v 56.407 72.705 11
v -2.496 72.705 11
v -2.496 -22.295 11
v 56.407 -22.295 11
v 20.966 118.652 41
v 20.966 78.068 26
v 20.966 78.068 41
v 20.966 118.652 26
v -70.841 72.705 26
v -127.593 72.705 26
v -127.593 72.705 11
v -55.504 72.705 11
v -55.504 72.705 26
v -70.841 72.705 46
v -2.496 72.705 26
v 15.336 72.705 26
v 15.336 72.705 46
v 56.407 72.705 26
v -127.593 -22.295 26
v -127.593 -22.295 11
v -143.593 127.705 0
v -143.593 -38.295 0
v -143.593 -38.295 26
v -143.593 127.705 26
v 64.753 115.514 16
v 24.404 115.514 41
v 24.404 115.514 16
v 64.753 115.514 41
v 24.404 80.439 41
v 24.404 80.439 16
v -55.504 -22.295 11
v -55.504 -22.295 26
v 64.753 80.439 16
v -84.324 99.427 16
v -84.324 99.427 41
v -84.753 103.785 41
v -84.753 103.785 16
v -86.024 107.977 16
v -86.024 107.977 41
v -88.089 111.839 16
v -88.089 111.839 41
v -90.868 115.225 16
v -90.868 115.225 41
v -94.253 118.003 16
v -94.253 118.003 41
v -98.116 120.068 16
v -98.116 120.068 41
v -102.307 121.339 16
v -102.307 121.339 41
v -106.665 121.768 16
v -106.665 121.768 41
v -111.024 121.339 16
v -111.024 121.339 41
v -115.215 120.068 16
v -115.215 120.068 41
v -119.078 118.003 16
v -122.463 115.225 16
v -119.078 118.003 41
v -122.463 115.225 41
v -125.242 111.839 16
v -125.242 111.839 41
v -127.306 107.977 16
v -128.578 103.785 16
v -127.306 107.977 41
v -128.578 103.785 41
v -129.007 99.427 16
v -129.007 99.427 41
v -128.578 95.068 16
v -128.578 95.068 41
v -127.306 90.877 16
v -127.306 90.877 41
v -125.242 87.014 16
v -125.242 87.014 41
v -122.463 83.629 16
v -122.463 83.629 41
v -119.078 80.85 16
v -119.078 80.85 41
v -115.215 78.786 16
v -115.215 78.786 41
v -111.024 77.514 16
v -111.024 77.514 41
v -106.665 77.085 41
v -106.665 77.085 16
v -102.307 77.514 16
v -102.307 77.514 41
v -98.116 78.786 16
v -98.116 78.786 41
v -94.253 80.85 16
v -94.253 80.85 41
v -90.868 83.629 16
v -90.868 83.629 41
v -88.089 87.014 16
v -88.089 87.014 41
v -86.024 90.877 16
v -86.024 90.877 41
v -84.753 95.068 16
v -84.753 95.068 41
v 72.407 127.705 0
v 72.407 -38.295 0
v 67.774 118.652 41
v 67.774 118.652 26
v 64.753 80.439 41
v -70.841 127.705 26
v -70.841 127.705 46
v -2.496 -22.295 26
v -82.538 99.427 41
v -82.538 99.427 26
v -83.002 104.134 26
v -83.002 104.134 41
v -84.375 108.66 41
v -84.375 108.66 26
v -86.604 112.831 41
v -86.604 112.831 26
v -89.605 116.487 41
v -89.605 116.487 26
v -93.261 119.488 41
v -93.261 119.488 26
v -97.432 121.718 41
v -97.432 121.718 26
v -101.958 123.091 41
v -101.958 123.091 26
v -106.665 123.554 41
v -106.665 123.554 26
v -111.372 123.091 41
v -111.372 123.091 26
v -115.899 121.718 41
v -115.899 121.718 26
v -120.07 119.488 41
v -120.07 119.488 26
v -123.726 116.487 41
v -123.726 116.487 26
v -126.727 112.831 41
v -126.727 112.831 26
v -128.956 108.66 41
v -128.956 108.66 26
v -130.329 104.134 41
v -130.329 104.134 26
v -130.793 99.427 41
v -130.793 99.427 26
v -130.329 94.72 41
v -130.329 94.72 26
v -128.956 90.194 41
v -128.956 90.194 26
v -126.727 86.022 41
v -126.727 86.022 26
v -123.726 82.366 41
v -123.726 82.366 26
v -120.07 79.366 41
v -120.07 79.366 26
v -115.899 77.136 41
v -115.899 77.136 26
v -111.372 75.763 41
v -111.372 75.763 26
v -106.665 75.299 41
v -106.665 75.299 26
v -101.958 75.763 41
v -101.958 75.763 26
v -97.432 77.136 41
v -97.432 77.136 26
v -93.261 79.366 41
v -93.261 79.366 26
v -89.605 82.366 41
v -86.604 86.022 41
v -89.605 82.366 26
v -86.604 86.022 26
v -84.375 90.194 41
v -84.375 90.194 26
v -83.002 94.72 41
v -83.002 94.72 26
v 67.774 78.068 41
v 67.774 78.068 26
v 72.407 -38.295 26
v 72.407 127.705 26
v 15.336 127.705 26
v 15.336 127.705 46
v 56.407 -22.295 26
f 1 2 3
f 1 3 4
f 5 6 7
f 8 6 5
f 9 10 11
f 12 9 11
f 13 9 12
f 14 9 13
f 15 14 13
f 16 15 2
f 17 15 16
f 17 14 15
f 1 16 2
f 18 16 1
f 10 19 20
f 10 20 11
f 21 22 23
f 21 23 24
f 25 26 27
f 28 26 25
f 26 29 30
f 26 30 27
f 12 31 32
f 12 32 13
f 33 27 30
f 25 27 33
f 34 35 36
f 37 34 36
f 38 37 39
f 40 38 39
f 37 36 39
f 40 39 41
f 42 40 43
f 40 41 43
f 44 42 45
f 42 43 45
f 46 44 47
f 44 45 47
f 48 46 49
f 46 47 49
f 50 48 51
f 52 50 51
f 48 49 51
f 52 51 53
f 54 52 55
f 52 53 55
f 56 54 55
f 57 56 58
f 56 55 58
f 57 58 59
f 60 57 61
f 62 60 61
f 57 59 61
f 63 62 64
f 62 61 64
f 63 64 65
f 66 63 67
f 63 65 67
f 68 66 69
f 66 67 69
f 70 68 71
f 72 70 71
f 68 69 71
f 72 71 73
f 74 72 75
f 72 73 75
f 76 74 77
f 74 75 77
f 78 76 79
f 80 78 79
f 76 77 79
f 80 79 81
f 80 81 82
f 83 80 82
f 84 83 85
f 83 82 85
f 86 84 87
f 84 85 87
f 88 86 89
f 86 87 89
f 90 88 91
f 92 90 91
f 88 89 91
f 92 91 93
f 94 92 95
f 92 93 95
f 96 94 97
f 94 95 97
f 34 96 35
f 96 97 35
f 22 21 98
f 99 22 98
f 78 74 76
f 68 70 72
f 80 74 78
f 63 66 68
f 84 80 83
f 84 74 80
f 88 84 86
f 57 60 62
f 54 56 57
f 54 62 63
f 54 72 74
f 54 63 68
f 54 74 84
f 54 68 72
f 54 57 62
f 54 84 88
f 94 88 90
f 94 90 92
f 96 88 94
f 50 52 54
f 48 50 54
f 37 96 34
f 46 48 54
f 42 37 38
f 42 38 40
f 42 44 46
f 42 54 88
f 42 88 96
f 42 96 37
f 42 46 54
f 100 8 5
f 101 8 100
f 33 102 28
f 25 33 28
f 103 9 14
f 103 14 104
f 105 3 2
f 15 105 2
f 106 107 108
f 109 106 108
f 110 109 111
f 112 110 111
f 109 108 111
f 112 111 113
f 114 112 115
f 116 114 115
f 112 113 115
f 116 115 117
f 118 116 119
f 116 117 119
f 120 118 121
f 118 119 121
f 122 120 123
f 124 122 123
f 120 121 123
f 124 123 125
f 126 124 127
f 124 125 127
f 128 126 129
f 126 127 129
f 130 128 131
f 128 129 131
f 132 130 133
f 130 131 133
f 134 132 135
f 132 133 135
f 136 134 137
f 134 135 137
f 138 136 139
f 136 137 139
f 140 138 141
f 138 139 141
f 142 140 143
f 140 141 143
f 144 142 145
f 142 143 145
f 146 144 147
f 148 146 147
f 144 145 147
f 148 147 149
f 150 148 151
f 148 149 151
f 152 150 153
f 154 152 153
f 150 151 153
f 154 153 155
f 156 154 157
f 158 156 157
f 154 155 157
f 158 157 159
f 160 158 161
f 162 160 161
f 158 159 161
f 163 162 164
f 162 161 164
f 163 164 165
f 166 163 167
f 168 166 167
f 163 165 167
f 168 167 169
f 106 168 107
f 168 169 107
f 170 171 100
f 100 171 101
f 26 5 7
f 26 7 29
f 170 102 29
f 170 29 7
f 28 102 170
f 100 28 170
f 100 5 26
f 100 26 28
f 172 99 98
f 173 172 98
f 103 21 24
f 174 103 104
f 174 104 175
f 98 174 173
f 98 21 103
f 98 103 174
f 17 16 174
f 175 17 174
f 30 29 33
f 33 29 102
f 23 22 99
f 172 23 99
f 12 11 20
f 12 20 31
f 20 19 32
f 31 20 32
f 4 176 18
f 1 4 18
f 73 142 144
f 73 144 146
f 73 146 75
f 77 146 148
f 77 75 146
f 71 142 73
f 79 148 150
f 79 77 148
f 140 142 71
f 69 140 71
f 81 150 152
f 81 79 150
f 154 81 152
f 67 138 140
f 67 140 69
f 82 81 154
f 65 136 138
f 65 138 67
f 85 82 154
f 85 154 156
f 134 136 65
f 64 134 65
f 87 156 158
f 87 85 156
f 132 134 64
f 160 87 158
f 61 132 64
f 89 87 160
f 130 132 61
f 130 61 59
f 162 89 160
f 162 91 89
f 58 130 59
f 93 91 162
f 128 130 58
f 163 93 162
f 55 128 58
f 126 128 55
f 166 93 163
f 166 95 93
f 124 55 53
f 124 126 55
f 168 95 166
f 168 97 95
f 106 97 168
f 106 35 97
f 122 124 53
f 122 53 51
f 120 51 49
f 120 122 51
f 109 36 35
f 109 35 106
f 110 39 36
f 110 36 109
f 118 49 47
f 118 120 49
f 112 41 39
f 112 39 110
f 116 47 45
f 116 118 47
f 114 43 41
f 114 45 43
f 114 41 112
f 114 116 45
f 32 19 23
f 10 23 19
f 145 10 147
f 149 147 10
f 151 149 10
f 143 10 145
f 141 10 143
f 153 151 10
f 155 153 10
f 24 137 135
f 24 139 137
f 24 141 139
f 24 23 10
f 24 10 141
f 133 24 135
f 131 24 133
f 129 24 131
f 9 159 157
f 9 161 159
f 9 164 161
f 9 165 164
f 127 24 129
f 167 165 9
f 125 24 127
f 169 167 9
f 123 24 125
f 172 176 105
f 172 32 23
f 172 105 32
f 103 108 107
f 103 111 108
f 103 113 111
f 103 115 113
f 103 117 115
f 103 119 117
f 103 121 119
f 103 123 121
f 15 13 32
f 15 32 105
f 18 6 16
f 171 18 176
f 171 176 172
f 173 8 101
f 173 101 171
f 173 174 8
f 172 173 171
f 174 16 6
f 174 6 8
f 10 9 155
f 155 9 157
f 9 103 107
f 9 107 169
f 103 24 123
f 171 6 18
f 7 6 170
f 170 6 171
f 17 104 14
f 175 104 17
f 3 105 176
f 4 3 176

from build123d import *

# Parameters (mm, degrees)
F0_W      = 216
F0_H      = 166
F1_DEPTH  = 26
F2_W      = 184
F2_H      = 95
F3_DEPTH  = 15
F4_W      = 86.176178
F4_H      = 55
F5_DEPTH  = 20
F6_W      = 53.007906
F6_H      = 95
F7_DEPTH  = 15
F8_R      = 24.127346
F9_DEPTH  = 15
F10_R     = 22.341692
F11_DEPTH = 25
F12_W     = 46.807702
F12_H     = 40.58332
F13_DEPTH = 15
F14_W     = 40.349298
F14_H     = 35.074882
F15_DEPTH = 25


with BuildPart() as f1:
    # F0 (on Top) → F1 (new body)
    with BuildSketch(Plane.XY):
        with Locations((-35.592673, 44.704702)):
            Rectangle(F0_W, F0_H)
    extrude(amount=F1_DEPTH)

    # F2 (on face) → F3 (cut)
    with BuildSketch(Plane.XY.offset(26)):
        with Locations((-35.592673, 25.204702)):
            Rectangle(F2_W, F2_H)
    extrude(amount=-F3_DEPTH, mode=Mode.SUBTRACT)

    # F4 (on face) → F5 (join)
    with BuildSketch(Plane.XY.offset(26)):
        with Locations((-27.75256, 100.204702)):
            Rectangle(F4_W, F4_H)
    extrude(amount=F5_DEPTH)

    # F6 (on face) → F7 (join)
    with BuildSketch(Plane.XY.offset(11)):
        with Locations((-28.99965, 25.204702)):
            Rectangle(F6_W, F6_H)
    extrude(amount=F7_DEPTH)

    # F8 (on face) → F9 (join)
    with BuildSketch(Plane.XY.offset(26)):
        with Locations((-106.665462, 99.426791)):
            Circle(F8_R)
    extrude(amount=F9_DEPTH)

    # F10 (on face) → F11 (cut)
    with BuildSketch(Plane.XY.offset(41)):
        with Locations((-106.665462, 99.426791)):
            Circle(F10_R)
    extrude(amount=-F11_DEPTH, mode=Mode.SUBTRACT)

    # F12 (on face) → F13 (join)
    with BuildSketch(Plane.XY.offset(26)):
        with Locations((44.370124, 98.360058)):
            Rectangle(F12_W, F12_H)
    extrude(amount=F13_DEPTH)

    # F14 (on face) → F15 (cut)
    with BuildSketch(Plane.XY.offset(41)):
        with Locations((44.578489, 97.976323)):
            Rectangle(F14_W, F14_H)
    extrude(amount=-F15_DEPTH, mode=Mode.SUBTRACT)


solid = f1.part
